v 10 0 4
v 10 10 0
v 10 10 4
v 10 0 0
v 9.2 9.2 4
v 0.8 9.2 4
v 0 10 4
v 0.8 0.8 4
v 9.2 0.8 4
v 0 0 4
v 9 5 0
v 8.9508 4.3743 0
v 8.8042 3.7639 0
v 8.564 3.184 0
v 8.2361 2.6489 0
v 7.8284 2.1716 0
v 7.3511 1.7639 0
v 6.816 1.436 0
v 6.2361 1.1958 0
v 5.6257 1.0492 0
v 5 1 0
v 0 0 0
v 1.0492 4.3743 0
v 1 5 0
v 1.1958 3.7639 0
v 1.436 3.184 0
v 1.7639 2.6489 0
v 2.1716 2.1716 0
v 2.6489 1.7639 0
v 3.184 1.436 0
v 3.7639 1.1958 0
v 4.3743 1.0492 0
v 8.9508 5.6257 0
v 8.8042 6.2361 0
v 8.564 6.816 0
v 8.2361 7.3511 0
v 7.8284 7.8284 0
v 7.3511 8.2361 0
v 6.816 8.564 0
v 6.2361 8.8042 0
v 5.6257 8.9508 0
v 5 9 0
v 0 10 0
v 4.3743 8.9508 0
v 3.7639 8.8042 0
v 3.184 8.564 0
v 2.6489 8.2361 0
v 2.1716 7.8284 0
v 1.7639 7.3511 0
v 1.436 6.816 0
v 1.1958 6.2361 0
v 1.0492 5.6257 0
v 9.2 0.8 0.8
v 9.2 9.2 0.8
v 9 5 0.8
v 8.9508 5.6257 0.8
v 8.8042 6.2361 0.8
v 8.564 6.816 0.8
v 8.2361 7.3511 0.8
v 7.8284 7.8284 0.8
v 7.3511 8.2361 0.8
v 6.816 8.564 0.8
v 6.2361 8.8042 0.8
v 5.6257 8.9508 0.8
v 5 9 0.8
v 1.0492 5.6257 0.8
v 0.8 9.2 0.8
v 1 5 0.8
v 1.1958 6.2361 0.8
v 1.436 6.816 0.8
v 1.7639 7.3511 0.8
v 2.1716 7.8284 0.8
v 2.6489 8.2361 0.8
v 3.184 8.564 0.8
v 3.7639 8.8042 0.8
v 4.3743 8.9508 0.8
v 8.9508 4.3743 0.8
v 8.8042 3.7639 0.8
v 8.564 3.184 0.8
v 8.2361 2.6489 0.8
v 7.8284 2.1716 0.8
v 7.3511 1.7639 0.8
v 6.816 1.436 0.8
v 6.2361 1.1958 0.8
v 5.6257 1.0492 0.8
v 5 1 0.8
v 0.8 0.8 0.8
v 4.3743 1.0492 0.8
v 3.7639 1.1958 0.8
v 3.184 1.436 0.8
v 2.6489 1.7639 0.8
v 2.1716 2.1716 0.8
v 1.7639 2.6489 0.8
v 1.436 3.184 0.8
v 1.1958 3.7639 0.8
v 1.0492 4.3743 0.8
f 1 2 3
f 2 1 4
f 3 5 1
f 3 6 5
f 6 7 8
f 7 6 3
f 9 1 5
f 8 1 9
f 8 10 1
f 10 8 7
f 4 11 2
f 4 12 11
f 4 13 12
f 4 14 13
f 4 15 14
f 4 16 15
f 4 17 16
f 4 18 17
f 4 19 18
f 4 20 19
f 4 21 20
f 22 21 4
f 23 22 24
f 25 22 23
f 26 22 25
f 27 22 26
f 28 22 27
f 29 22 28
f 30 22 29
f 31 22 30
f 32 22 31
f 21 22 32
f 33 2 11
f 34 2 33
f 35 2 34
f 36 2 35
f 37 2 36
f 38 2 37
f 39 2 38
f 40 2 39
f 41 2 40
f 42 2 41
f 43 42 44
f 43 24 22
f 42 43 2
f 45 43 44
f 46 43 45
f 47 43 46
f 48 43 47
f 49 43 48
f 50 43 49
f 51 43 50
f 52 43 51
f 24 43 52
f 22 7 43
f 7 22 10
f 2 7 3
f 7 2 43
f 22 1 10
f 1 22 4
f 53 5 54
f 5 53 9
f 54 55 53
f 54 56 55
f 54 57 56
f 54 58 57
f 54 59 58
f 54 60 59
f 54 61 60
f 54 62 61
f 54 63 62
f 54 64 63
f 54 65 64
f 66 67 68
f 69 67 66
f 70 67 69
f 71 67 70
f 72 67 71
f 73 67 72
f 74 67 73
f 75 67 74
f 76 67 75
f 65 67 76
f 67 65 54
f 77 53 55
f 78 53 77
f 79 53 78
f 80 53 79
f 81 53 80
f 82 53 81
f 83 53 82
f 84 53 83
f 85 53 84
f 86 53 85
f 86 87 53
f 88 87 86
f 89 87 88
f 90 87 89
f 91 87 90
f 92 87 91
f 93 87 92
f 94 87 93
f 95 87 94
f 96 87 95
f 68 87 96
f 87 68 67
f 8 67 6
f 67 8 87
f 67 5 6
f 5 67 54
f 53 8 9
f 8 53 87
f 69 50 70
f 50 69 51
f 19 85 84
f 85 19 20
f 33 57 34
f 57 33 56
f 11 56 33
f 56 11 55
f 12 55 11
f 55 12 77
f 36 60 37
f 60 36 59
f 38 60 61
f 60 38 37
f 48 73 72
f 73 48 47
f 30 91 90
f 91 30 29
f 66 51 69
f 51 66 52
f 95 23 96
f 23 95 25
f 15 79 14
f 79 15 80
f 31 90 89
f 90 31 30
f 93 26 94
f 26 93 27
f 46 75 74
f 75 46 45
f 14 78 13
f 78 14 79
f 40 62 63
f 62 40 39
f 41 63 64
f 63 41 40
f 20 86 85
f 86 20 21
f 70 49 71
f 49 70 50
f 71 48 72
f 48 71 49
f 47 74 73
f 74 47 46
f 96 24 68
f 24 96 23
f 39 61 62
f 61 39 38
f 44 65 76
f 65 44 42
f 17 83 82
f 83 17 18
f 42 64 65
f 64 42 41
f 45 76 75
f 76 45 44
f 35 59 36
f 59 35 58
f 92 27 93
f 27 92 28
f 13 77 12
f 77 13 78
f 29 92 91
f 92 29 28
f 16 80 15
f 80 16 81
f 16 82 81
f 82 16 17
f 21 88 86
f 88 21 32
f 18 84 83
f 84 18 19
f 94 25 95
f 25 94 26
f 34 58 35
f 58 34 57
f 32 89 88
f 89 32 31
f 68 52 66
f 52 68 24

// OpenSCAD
difference() {
  cube([10,10,4]);
  translate([.8,.8,.8]) cube([8.4,8.4,6]);
  translate([5,5,-.1]) cylinder(d=8,h=4,$fn=40);
}
